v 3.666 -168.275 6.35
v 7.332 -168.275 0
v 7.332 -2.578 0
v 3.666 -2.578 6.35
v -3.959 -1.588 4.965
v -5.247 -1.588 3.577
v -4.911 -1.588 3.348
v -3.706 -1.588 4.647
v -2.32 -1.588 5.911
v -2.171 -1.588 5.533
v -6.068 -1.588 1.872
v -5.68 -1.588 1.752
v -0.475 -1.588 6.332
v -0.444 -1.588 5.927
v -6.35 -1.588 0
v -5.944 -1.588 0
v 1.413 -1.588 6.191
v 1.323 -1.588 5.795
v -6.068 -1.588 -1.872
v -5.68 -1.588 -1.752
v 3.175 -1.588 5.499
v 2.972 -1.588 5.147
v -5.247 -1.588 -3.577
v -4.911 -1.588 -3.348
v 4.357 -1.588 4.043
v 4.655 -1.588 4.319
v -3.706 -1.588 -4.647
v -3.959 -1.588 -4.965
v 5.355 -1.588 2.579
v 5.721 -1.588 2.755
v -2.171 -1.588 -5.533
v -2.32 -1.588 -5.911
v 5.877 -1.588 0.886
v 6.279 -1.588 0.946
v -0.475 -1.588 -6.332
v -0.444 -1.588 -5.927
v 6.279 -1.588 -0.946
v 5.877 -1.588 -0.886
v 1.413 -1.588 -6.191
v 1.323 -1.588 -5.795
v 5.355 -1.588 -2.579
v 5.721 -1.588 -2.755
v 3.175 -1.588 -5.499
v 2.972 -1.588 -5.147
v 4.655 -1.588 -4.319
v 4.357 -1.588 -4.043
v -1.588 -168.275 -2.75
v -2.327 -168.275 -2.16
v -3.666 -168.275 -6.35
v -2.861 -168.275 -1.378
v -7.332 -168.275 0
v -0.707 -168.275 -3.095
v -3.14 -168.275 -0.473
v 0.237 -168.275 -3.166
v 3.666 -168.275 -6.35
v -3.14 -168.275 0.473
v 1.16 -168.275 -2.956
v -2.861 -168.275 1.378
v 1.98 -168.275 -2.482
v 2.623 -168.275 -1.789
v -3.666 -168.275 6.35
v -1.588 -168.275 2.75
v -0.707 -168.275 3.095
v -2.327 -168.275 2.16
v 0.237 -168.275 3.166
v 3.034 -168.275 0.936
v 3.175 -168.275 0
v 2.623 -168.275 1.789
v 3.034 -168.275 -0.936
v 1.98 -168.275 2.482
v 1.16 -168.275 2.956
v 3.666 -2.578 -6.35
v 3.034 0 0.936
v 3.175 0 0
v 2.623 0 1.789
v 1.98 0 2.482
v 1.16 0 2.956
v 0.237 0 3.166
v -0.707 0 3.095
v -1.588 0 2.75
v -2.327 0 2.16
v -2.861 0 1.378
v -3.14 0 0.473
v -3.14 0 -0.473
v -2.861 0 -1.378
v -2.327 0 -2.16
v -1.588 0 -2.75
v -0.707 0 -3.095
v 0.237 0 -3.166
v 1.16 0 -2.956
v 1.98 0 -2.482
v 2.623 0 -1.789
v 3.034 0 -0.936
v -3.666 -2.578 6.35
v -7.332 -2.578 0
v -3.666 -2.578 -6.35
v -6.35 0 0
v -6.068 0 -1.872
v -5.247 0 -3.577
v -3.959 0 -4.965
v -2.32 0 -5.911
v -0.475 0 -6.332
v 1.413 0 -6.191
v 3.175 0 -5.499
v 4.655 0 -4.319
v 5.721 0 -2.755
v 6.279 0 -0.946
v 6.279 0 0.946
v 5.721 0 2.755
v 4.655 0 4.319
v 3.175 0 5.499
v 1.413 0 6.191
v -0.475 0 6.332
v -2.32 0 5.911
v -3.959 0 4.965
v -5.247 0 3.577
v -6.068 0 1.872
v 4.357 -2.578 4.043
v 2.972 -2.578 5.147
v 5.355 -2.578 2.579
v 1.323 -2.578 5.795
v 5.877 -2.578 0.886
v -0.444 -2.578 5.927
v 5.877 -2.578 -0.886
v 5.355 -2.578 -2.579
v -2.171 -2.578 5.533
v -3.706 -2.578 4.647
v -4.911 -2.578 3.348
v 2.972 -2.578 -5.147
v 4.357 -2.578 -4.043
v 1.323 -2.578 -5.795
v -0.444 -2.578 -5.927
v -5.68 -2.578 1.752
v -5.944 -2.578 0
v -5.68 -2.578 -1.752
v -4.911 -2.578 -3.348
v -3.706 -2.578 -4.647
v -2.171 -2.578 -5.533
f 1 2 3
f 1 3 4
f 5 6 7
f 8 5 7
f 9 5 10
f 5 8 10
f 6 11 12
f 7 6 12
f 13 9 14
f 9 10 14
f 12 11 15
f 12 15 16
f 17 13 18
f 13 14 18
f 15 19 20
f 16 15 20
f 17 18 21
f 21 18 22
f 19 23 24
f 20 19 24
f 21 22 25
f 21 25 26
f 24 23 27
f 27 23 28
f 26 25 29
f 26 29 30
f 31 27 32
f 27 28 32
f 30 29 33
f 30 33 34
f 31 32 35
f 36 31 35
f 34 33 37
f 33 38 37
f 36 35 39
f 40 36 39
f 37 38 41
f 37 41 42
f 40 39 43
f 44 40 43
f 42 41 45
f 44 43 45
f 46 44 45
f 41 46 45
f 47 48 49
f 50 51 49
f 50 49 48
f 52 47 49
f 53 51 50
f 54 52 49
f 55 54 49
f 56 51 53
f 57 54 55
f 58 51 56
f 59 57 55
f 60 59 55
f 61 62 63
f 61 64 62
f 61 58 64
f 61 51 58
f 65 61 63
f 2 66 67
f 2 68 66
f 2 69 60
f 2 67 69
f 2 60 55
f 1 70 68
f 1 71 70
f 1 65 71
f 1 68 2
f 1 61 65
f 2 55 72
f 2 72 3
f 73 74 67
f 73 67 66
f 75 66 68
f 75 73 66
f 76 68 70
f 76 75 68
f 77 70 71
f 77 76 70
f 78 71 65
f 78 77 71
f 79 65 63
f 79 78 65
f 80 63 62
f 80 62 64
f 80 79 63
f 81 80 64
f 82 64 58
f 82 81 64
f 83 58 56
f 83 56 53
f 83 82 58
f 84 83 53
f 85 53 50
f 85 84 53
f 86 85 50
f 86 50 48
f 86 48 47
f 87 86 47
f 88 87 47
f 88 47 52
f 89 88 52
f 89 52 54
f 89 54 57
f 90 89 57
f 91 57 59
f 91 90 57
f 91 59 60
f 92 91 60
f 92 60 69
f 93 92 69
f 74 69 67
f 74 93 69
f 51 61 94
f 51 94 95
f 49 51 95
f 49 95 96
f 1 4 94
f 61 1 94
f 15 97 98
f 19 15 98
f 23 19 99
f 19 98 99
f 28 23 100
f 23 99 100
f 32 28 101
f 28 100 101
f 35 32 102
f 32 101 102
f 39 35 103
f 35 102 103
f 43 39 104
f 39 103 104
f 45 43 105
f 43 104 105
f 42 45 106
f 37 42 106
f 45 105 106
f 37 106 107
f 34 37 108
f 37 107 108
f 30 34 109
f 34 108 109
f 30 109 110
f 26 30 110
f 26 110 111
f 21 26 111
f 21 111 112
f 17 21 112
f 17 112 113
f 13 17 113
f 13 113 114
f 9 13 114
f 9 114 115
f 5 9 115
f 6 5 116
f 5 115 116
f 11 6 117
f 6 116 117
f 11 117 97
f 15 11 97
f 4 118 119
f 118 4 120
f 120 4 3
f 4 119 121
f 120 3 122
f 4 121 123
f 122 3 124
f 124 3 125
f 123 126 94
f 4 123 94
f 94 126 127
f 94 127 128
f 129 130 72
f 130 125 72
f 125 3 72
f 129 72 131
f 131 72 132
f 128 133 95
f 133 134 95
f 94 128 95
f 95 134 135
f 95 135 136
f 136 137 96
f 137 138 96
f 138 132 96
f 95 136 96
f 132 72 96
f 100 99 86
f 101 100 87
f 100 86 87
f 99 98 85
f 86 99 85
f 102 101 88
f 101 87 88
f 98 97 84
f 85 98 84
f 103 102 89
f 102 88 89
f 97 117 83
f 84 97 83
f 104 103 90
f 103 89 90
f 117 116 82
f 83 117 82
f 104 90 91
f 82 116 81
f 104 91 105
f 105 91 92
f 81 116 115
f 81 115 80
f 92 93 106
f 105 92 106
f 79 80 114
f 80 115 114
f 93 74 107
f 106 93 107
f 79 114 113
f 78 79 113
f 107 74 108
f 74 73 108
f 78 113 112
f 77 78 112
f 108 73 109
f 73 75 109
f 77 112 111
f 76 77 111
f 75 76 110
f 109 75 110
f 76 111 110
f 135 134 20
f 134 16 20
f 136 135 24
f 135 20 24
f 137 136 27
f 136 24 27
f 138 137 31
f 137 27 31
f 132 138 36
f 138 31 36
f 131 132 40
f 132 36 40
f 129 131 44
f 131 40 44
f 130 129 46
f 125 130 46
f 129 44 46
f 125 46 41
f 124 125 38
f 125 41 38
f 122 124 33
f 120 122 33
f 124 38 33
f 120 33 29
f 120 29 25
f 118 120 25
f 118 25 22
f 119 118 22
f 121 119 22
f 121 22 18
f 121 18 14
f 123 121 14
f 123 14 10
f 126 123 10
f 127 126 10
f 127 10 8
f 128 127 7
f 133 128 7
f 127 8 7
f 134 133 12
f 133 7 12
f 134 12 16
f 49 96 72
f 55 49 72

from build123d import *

# Parameters (mm, degrees)
F0_R     = 3.175
F1_DEPTH = 168.275


with BuildPart() as f1:
    # F0 (on Front) → F1 (new body)
    with BuildSketch(Plane.XZ):
        Polygon((3.6661742094, 6.35), (-3.6661742094, 6.35), (-7.3323484187, 0), (-3.6661742094, -6.35), (3.6661742094, -6.35), (7.3323484187, 0), align=None)
        Circle(F0_R, mode=Mode.SUBTRACT)
    extrude(amount=F1_DEPTH)

    # F2 (on Top) → F3 (revolve, cut)
    with BuildSketch(Plane.XY):
        Polygon((-6.35, -1.5875), (-6.35, 0), (-7.3323484187, 0), (-7.3323484187, -2.5781), (-5.9436, -2.5781), (-5.9436, -1.5875), align=None)
    revolve(axis=Axis((0, -1.28905, 0), (0, -1, 0)), mode=Mode.SUBTRACT)


solid = f1.part
